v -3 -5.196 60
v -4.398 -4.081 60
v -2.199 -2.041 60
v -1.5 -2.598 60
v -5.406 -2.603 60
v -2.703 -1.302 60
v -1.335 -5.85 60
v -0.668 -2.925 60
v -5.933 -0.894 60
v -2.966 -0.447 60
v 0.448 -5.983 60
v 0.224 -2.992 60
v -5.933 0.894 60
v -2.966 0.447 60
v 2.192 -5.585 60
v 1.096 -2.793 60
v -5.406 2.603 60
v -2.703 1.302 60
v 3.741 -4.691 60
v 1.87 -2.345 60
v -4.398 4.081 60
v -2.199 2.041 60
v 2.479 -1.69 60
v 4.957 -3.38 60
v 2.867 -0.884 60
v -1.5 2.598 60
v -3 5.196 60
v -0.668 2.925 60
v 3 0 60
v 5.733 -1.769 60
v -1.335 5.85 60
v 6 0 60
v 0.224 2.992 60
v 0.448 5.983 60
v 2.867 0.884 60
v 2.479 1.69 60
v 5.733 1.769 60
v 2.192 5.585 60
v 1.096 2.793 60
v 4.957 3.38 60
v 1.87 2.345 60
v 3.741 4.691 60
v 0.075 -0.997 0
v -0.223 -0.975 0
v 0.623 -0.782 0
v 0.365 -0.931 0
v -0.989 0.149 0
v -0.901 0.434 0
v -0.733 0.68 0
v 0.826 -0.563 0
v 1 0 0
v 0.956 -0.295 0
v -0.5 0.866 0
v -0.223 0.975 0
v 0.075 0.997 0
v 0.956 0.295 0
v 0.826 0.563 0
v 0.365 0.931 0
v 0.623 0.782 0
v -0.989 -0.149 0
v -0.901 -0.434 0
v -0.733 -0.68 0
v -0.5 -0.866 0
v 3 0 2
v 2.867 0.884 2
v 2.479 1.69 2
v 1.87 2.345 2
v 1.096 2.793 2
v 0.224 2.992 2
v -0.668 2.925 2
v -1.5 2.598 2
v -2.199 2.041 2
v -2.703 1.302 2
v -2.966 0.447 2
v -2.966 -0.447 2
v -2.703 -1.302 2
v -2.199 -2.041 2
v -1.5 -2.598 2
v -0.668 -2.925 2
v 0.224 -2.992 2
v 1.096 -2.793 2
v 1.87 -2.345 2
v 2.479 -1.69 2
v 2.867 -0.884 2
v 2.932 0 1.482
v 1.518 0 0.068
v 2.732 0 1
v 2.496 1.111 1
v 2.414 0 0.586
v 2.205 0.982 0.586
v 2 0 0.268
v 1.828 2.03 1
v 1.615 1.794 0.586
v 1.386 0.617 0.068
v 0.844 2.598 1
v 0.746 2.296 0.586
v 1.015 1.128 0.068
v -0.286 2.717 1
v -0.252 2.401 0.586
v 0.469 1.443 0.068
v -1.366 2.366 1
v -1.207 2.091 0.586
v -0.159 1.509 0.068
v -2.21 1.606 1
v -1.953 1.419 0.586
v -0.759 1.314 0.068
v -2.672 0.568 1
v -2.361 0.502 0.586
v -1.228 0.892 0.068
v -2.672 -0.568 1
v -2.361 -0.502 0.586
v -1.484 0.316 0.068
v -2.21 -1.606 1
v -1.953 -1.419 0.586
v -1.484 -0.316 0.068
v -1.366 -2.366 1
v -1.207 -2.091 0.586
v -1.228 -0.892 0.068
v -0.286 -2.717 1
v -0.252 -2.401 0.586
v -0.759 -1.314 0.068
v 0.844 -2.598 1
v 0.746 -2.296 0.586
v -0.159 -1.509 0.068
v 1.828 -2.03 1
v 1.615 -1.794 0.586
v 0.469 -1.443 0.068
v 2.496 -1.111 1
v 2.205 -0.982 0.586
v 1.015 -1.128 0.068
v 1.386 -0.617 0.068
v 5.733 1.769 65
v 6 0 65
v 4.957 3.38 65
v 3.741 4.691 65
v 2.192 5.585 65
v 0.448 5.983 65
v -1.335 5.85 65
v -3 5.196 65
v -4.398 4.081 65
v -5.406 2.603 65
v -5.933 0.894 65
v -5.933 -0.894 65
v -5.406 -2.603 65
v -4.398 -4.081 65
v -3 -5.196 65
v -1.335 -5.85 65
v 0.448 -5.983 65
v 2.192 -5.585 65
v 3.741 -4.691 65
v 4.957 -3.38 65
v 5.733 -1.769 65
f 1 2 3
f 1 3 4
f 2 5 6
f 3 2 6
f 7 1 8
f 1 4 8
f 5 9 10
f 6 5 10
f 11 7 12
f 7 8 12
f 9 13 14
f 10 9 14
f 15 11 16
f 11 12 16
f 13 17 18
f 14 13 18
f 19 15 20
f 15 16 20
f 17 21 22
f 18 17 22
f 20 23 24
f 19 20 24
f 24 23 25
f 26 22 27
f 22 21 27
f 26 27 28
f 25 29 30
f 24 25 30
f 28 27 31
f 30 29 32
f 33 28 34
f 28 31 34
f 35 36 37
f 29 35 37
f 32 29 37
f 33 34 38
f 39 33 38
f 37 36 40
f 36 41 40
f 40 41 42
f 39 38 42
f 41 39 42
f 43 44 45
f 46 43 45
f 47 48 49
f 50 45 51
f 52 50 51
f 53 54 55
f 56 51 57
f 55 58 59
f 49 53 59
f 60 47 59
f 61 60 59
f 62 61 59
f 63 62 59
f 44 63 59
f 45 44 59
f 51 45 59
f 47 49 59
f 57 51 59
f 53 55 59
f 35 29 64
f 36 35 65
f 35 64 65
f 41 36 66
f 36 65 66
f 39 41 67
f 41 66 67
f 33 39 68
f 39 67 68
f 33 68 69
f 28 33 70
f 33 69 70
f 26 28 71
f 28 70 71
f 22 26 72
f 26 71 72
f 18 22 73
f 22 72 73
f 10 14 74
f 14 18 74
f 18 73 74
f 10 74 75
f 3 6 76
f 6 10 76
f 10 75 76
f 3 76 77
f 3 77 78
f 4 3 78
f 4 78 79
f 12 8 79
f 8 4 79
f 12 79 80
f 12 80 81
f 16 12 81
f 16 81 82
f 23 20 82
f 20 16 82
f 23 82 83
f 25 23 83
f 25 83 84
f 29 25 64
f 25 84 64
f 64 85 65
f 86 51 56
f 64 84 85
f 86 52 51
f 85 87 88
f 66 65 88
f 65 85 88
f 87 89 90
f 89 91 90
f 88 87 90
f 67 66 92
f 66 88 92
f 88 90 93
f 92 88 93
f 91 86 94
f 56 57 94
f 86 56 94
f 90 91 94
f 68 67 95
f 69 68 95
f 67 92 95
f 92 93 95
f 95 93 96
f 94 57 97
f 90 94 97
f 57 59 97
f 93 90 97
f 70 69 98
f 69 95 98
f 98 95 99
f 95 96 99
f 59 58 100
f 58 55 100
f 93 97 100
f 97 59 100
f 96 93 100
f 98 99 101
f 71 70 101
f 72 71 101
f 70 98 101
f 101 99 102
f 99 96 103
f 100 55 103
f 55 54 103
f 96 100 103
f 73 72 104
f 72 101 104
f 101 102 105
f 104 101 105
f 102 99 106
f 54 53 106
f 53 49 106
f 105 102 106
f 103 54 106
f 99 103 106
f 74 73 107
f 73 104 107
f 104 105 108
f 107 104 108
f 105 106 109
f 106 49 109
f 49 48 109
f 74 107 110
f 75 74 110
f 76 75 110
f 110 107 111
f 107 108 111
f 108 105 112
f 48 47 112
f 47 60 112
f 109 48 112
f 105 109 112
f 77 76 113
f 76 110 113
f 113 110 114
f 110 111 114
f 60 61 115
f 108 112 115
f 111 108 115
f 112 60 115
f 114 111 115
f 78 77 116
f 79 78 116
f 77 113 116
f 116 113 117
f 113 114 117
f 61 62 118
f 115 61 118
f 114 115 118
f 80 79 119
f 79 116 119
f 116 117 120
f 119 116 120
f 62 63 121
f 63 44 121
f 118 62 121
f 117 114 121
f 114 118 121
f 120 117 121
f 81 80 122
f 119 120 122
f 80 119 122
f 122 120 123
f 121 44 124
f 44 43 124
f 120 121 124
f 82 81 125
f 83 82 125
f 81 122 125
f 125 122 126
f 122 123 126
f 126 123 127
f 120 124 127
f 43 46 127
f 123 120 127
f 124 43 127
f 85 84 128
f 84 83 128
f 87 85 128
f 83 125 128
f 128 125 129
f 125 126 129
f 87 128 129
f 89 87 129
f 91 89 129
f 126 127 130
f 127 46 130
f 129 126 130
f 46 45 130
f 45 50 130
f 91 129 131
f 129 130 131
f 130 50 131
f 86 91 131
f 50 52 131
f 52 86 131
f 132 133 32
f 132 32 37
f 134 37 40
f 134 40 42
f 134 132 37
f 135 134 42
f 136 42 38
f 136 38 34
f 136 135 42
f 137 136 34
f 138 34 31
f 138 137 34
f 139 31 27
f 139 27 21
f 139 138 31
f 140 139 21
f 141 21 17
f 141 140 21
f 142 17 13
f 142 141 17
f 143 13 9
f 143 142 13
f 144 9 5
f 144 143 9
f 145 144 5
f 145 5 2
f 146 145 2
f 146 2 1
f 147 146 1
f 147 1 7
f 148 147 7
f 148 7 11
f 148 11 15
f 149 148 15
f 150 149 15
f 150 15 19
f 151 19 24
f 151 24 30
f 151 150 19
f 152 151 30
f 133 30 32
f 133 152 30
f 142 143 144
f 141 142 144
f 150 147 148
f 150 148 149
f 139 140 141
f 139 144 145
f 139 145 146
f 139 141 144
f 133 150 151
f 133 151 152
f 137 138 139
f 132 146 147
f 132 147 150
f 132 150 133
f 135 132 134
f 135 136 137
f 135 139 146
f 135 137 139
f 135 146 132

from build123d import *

# Parameters (mm, degrees)
SKETCH1_R           = 3
BOSS_EXTRUDE1_DEPTH = 65
SKETCH2_R           = 6
BOSS_EXTRUDE2_DEPTH = 5
FILLET1_R           = 2


with BuildPart() as part:
    # Sketch1 → Boss-Extrude1 (new body)
    with BuildSketch(Plane.XY):
        Circle(SKETCH1_R)
    extrude(amount=BOSS_EXTRUDE1_DEPTH)

    # Sketch2 → Boss-Extrude2 (add)
    with BuildSketch(Plane.XY.offset(65)):
        Circle(SKETCH2_R)
    extrude(amount=-BOSS_EXTRUDE2_DEPTH)

    # Fillet1
    fillet1_edges = [part.edges().sort_by_distance(p)[0] for p in [
        (-3, 0, 0),
    ]]
    fillet(fillet1_edges, radius=FILLET1_R)


solid = part.part
